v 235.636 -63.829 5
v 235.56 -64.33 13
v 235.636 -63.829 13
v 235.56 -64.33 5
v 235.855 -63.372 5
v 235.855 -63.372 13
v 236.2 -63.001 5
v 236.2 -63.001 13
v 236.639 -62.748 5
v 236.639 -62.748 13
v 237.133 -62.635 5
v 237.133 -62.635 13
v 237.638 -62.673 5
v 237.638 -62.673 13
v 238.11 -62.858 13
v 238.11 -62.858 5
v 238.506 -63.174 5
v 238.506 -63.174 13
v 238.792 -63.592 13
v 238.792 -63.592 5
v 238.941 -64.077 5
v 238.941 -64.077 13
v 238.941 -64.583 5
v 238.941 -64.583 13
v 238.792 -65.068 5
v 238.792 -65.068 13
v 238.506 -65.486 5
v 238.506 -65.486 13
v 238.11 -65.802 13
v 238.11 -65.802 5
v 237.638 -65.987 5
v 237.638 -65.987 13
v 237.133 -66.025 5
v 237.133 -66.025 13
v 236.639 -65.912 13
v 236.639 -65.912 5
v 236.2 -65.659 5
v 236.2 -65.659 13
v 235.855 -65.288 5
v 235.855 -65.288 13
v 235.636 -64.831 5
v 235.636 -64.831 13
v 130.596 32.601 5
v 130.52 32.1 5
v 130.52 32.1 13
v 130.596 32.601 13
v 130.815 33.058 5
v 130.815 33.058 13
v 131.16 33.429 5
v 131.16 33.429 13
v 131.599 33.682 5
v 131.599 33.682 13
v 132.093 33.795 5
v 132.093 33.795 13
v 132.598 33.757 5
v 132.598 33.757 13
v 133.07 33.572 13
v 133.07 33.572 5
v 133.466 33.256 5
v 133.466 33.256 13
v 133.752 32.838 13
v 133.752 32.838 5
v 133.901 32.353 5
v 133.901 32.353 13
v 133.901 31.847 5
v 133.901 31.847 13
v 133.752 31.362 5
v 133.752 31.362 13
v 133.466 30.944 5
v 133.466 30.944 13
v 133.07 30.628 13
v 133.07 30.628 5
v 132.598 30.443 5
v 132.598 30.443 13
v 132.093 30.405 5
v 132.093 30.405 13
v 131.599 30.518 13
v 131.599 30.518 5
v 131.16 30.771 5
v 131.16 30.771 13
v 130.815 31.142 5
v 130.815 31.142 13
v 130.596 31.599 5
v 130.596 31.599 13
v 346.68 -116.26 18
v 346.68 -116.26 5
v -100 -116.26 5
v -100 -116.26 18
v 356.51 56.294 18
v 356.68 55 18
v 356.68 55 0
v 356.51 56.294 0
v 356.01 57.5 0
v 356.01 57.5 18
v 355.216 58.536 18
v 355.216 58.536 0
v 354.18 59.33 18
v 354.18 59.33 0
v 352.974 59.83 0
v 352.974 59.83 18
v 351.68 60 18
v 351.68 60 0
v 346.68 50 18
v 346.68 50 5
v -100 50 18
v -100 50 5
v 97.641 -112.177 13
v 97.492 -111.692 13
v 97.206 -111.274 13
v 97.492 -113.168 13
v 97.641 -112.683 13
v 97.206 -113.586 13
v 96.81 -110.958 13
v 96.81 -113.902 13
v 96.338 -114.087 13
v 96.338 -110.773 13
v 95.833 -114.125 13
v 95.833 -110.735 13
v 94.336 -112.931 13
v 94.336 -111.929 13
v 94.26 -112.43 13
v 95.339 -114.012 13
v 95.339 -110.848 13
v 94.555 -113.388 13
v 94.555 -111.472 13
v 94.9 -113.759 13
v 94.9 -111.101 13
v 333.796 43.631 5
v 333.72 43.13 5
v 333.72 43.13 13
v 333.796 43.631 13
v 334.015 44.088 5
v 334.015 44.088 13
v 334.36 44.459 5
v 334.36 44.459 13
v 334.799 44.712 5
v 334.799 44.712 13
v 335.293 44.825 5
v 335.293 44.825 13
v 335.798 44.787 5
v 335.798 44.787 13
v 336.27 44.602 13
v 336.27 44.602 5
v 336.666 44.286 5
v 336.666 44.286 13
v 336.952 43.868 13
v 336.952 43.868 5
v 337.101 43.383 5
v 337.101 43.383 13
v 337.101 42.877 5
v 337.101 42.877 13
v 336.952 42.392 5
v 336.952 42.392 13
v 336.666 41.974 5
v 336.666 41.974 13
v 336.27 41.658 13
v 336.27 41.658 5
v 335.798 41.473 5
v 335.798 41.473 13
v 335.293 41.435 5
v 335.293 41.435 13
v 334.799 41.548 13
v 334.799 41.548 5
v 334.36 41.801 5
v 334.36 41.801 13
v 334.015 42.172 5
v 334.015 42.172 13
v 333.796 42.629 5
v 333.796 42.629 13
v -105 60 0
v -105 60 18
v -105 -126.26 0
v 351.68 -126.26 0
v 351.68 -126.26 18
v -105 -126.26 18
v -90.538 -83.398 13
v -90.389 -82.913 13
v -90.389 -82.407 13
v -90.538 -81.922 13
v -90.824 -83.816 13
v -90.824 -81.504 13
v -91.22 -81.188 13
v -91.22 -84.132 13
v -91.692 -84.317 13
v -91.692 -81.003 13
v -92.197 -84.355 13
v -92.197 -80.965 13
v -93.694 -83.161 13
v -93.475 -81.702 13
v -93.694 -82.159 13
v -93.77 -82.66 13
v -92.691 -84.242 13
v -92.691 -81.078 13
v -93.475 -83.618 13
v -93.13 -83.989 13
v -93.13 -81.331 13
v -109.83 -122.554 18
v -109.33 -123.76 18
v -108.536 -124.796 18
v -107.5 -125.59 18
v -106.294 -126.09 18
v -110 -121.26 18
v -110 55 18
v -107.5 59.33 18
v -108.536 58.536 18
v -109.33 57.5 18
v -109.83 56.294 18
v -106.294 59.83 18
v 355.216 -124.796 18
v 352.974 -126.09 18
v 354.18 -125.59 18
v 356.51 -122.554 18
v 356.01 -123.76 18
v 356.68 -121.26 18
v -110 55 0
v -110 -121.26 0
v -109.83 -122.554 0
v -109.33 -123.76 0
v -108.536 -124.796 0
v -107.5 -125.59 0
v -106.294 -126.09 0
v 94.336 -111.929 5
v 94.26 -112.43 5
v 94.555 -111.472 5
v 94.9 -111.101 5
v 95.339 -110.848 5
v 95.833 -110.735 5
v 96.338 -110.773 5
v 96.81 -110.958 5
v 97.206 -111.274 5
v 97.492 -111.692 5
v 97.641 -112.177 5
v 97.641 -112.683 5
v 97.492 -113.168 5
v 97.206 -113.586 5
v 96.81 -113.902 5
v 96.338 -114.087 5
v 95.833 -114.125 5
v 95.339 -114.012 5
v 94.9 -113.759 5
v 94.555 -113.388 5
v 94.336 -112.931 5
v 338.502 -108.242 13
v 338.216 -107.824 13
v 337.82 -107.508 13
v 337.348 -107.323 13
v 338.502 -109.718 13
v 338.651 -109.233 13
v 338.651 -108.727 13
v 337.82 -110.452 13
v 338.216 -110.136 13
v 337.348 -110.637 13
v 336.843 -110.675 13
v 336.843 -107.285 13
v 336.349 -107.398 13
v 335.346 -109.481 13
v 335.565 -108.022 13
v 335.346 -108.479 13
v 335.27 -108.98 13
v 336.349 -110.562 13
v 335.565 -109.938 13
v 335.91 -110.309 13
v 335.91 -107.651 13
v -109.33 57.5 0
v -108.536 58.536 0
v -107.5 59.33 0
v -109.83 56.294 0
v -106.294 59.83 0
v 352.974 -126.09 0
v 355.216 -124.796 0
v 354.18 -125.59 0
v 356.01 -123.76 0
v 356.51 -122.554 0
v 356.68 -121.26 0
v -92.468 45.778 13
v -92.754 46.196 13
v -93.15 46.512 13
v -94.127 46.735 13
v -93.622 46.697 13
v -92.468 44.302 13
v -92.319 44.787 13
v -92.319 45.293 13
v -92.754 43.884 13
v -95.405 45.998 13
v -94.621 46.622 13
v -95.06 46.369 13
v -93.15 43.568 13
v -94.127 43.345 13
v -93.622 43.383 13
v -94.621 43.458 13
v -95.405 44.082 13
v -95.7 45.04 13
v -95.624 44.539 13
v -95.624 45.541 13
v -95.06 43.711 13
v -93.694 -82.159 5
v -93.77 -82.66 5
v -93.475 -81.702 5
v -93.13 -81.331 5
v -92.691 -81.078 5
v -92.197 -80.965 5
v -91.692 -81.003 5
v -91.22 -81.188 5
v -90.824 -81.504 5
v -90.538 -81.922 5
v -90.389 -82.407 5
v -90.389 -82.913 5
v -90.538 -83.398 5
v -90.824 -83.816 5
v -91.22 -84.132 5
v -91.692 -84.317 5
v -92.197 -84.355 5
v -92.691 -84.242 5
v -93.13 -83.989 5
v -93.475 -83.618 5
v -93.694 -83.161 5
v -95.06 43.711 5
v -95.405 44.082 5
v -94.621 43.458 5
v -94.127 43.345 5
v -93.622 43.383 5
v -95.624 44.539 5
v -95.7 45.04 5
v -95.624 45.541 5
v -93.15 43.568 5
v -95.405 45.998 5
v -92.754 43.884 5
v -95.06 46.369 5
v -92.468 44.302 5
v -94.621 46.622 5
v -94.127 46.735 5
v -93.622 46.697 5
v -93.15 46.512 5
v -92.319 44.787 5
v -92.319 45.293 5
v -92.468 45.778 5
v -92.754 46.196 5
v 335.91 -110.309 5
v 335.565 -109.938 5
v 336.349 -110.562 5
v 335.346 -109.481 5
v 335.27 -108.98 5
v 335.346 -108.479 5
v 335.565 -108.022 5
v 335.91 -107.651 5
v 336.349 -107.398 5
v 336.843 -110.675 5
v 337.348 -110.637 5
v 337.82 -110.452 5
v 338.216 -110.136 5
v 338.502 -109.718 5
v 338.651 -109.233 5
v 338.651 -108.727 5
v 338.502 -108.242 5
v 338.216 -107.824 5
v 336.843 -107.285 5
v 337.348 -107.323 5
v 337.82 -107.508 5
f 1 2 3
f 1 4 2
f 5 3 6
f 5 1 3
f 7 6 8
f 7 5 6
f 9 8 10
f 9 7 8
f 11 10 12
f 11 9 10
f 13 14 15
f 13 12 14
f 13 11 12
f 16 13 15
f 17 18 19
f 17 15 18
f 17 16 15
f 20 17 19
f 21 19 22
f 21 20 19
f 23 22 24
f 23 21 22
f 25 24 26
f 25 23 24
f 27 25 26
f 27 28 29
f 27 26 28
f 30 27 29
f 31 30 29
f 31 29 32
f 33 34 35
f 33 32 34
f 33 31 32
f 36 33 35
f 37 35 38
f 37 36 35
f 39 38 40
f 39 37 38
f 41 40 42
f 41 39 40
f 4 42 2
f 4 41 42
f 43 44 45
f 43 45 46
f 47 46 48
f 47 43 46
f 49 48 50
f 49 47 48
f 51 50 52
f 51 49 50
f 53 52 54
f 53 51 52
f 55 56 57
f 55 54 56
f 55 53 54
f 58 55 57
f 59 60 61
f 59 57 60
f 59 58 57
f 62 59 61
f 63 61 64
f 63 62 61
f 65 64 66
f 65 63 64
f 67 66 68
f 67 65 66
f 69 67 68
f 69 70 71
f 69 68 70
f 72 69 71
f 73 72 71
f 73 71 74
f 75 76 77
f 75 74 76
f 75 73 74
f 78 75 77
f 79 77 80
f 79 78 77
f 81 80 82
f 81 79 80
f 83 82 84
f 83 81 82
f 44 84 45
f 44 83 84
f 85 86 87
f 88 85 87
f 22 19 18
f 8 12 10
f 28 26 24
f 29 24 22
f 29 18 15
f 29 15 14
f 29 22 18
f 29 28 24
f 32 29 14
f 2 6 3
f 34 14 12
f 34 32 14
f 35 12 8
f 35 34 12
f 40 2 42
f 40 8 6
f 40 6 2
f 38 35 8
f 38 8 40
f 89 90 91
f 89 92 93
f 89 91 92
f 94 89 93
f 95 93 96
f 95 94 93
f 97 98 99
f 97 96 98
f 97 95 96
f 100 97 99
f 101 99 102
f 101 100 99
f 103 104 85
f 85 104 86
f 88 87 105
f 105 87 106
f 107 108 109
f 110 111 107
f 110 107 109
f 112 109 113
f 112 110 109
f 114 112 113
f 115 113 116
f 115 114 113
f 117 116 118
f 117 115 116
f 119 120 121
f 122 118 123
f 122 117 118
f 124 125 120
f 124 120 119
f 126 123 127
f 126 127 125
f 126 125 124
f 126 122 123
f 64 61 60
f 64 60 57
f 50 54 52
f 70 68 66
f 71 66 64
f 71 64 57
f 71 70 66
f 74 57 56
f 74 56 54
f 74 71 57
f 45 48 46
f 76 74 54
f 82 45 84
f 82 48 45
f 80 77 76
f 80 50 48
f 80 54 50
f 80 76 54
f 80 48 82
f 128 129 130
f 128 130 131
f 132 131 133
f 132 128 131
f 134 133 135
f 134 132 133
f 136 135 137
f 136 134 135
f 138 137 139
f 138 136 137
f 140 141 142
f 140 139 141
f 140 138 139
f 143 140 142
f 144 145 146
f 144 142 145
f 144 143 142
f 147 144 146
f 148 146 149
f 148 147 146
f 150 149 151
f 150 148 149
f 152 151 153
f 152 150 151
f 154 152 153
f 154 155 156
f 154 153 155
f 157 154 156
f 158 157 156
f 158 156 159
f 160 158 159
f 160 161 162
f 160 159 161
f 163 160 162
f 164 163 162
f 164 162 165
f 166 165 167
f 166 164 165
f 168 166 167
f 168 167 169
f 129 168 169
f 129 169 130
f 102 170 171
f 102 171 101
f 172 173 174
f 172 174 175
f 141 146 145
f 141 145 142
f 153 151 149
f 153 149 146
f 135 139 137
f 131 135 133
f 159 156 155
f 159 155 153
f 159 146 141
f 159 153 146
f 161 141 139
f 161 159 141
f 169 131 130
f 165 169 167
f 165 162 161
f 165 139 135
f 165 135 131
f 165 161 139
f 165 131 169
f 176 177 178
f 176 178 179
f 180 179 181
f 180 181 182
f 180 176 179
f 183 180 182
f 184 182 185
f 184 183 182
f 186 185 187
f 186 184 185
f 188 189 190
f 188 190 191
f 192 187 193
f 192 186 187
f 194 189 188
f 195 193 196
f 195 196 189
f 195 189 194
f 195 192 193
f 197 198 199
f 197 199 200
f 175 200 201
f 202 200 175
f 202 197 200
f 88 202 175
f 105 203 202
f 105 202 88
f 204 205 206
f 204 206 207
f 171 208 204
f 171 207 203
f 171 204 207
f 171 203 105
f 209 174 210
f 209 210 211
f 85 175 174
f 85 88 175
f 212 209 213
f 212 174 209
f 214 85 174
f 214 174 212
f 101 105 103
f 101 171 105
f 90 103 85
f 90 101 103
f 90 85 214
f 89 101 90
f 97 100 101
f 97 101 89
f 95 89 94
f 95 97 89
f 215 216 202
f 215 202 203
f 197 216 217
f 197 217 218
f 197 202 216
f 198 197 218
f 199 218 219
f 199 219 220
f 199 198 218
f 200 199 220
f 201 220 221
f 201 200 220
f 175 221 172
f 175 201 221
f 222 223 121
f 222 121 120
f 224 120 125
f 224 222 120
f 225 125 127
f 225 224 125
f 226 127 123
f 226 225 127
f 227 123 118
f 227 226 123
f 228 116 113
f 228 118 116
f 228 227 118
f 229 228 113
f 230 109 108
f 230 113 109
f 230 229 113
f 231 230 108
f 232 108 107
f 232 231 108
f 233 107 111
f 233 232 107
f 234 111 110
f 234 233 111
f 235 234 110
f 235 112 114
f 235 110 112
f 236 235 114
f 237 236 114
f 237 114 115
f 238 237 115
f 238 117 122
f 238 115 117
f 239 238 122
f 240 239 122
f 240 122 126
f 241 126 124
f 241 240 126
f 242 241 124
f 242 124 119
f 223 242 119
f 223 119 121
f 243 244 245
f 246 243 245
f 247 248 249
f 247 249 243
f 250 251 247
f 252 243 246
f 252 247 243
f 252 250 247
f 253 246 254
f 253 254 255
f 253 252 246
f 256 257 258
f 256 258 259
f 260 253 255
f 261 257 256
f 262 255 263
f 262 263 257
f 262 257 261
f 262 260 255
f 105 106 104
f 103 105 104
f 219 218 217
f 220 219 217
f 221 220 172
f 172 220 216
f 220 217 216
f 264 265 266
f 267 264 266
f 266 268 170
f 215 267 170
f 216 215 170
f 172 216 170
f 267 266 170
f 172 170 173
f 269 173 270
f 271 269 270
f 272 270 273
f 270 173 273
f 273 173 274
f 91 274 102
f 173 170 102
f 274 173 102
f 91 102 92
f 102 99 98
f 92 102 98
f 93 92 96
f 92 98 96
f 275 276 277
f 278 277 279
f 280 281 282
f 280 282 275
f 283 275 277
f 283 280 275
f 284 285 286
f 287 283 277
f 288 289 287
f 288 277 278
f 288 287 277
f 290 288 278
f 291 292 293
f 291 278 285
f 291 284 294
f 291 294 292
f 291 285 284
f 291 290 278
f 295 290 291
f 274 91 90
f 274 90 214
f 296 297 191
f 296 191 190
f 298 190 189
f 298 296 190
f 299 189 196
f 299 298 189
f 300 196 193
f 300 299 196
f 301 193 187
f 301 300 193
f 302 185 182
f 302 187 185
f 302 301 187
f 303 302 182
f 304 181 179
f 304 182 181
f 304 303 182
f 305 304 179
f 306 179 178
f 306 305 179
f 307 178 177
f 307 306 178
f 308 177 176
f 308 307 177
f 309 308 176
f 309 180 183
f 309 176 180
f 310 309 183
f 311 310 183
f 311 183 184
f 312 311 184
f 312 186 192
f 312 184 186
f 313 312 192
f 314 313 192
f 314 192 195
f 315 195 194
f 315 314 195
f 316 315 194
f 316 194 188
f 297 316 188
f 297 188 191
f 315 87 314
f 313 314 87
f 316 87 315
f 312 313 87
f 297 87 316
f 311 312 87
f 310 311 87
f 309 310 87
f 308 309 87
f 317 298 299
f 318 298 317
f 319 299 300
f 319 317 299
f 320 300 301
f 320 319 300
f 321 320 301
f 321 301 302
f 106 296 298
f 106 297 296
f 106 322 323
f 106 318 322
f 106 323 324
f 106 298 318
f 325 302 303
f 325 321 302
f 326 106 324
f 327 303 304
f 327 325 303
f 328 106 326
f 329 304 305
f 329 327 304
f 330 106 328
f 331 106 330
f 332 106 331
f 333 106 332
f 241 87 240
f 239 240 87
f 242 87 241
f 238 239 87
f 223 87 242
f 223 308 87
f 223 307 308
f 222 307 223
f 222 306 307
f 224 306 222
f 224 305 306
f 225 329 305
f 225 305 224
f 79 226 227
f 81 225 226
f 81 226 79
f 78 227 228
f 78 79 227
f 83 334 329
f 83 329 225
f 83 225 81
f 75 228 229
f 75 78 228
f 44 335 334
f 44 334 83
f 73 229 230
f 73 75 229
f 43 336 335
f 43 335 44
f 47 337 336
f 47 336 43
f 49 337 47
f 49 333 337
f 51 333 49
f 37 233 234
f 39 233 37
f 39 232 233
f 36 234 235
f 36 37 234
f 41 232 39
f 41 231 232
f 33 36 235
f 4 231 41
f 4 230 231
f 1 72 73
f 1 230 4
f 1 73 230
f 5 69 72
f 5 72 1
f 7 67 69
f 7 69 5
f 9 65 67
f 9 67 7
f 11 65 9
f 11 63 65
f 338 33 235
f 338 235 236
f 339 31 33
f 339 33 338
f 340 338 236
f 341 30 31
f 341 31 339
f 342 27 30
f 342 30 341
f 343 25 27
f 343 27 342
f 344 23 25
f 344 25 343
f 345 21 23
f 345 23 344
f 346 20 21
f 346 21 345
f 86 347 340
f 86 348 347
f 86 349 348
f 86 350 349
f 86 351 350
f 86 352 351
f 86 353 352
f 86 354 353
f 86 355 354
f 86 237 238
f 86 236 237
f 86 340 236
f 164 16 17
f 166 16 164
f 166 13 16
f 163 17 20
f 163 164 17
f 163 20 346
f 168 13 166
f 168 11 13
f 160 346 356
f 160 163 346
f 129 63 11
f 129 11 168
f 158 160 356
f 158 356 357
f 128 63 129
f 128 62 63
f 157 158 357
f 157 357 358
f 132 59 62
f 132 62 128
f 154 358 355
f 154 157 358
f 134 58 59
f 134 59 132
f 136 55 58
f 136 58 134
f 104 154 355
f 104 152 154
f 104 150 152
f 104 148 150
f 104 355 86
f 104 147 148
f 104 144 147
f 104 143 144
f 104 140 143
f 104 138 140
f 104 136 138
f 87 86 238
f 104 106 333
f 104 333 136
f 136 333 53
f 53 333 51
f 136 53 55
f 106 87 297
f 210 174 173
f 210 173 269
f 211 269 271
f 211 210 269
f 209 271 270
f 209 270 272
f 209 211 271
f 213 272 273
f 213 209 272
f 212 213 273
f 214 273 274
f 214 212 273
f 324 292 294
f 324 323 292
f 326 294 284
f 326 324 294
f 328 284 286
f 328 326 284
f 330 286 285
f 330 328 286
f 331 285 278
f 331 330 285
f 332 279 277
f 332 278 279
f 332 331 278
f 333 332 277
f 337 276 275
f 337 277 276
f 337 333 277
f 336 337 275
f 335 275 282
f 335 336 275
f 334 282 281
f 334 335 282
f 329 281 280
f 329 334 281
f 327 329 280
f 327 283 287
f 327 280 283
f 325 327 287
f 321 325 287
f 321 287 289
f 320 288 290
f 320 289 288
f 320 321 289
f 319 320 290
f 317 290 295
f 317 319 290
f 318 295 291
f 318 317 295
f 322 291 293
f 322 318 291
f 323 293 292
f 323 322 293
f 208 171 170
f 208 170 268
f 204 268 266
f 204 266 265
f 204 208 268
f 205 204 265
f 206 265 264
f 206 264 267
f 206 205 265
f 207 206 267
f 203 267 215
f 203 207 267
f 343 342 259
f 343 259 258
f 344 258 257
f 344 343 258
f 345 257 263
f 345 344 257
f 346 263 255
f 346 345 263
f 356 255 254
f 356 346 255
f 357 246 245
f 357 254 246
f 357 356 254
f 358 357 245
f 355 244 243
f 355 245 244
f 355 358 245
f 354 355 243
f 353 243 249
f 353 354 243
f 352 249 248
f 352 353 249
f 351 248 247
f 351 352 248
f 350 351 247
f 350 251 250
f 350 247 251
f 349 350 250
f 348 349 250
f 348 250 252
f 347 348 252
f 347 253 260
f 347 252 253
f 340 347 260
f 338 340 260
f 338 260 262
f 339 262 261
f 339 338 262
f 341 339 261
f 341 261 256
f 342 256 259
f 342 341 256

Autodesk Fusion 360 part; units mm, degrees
sketch "Sketch1" plane through (0, 0, 0) normal (0, 0, 1) x (1, 0, 0)
  line L0 (-100, 50) -> (346.68, 50)
  line L1 (346.68, 50) -> (346.68, -116.26)
  line L2 (346.68, -116.26) -> (-100, -116.26)
  line L3 (-100, -116.26) -> (-100, 50)
  line L4 (-110, 60) -> (356.68, 60)
  line L5 (356.68, 60) -> (356.68, -126.26)
  line L6 (356.68, -126.26) -> (-110, -126.26)
  line L7 (-110, -126.26) -> (-110, 60)
  dimension "d1" = 446.68
  dimension "d2" = 166.26
  dimension "d3" = 466.68
  dimension "d4" = 186.26
  dimension "d5" = 10
  dimension "d6" = 10
extrude "Extrude1" add sketch "Sketch1" along normal blind 5 contours L0 L1 L2 L3
extrude "Extrude2" add sketch "Sketch1" along normal blind 18
sketch "Sketch2" plane through (0, 0, 5) normal (0, 0, 1) x (-1, 0, 0)
  line L0 (100, 116.26) -> (-346.68, 116.26)
  line L1 (-346.68, 116.26) -> (-346.68, -50)
  line L2 (-346.68, -50) -> (100, -50)
  line L3 (100, -50) -> (100, 116.26)
  circle A0 centre (94, -45.04) radius 1.7
  circle A1 centre (-132.22, -32.1) radius 1.7
  circle A2 centre (92.07, 82.66) radius 1.7
  circle A3 centre (-95.96, 112.43) radius 1.7
  circle A4 centre (-237.26, 64.33) radius 1.7
  circle A5 centre (-335.42, -43.13) radius 1.7
  circle A6 centre (-336.97, 108.98) radius 1.7
  line L4 (100, -50) -> (-346.68, -50)
  line L5 (100, 116.26) -> (100, -50)
  line L6 (-346.68, 116.26) -> (100, 116.26)
  line L7 (-346.68, -50) -> (-346.68, 116.26)
  dimension "d11" = 3.4
  dimension "d12" = 3.4
  dimension "d13" = 3.4
  dimension "d14" = 3.4
  dimension "d15" = 3.4
  dimension "d16" = 3.4
  dimension "d17" = 3.4
  dimension "d18" = 4.96
  dimension "d19" = 6
  dimension "d20" = 7.93
  dimension "d21" = 33.6
  dimension "d22" = 195.96
  dimension "d23" = 3.83
  dimension "d24" = 109.42
  dimension "d25" = 51.93
  dimension "d26" = 7.28
  dimension "d27" = 9.71
  dimension "d28" = 11.26
  dimension "d29" = 6.87
  dimension "d30" = 214.46
  dimension "d31" = 17.9
extrude "Extrude3" add sketch "Sketch2" along normal blind 8 contours A0 | A1 | A2 | A3 | A4 | A5 | A6
fillet "Fillet1" radius 5 4 edges at (356.68, -126.26, 9) (356.68, 60, 9) (-110, 60, 9) (-110, -126.26, 9)
